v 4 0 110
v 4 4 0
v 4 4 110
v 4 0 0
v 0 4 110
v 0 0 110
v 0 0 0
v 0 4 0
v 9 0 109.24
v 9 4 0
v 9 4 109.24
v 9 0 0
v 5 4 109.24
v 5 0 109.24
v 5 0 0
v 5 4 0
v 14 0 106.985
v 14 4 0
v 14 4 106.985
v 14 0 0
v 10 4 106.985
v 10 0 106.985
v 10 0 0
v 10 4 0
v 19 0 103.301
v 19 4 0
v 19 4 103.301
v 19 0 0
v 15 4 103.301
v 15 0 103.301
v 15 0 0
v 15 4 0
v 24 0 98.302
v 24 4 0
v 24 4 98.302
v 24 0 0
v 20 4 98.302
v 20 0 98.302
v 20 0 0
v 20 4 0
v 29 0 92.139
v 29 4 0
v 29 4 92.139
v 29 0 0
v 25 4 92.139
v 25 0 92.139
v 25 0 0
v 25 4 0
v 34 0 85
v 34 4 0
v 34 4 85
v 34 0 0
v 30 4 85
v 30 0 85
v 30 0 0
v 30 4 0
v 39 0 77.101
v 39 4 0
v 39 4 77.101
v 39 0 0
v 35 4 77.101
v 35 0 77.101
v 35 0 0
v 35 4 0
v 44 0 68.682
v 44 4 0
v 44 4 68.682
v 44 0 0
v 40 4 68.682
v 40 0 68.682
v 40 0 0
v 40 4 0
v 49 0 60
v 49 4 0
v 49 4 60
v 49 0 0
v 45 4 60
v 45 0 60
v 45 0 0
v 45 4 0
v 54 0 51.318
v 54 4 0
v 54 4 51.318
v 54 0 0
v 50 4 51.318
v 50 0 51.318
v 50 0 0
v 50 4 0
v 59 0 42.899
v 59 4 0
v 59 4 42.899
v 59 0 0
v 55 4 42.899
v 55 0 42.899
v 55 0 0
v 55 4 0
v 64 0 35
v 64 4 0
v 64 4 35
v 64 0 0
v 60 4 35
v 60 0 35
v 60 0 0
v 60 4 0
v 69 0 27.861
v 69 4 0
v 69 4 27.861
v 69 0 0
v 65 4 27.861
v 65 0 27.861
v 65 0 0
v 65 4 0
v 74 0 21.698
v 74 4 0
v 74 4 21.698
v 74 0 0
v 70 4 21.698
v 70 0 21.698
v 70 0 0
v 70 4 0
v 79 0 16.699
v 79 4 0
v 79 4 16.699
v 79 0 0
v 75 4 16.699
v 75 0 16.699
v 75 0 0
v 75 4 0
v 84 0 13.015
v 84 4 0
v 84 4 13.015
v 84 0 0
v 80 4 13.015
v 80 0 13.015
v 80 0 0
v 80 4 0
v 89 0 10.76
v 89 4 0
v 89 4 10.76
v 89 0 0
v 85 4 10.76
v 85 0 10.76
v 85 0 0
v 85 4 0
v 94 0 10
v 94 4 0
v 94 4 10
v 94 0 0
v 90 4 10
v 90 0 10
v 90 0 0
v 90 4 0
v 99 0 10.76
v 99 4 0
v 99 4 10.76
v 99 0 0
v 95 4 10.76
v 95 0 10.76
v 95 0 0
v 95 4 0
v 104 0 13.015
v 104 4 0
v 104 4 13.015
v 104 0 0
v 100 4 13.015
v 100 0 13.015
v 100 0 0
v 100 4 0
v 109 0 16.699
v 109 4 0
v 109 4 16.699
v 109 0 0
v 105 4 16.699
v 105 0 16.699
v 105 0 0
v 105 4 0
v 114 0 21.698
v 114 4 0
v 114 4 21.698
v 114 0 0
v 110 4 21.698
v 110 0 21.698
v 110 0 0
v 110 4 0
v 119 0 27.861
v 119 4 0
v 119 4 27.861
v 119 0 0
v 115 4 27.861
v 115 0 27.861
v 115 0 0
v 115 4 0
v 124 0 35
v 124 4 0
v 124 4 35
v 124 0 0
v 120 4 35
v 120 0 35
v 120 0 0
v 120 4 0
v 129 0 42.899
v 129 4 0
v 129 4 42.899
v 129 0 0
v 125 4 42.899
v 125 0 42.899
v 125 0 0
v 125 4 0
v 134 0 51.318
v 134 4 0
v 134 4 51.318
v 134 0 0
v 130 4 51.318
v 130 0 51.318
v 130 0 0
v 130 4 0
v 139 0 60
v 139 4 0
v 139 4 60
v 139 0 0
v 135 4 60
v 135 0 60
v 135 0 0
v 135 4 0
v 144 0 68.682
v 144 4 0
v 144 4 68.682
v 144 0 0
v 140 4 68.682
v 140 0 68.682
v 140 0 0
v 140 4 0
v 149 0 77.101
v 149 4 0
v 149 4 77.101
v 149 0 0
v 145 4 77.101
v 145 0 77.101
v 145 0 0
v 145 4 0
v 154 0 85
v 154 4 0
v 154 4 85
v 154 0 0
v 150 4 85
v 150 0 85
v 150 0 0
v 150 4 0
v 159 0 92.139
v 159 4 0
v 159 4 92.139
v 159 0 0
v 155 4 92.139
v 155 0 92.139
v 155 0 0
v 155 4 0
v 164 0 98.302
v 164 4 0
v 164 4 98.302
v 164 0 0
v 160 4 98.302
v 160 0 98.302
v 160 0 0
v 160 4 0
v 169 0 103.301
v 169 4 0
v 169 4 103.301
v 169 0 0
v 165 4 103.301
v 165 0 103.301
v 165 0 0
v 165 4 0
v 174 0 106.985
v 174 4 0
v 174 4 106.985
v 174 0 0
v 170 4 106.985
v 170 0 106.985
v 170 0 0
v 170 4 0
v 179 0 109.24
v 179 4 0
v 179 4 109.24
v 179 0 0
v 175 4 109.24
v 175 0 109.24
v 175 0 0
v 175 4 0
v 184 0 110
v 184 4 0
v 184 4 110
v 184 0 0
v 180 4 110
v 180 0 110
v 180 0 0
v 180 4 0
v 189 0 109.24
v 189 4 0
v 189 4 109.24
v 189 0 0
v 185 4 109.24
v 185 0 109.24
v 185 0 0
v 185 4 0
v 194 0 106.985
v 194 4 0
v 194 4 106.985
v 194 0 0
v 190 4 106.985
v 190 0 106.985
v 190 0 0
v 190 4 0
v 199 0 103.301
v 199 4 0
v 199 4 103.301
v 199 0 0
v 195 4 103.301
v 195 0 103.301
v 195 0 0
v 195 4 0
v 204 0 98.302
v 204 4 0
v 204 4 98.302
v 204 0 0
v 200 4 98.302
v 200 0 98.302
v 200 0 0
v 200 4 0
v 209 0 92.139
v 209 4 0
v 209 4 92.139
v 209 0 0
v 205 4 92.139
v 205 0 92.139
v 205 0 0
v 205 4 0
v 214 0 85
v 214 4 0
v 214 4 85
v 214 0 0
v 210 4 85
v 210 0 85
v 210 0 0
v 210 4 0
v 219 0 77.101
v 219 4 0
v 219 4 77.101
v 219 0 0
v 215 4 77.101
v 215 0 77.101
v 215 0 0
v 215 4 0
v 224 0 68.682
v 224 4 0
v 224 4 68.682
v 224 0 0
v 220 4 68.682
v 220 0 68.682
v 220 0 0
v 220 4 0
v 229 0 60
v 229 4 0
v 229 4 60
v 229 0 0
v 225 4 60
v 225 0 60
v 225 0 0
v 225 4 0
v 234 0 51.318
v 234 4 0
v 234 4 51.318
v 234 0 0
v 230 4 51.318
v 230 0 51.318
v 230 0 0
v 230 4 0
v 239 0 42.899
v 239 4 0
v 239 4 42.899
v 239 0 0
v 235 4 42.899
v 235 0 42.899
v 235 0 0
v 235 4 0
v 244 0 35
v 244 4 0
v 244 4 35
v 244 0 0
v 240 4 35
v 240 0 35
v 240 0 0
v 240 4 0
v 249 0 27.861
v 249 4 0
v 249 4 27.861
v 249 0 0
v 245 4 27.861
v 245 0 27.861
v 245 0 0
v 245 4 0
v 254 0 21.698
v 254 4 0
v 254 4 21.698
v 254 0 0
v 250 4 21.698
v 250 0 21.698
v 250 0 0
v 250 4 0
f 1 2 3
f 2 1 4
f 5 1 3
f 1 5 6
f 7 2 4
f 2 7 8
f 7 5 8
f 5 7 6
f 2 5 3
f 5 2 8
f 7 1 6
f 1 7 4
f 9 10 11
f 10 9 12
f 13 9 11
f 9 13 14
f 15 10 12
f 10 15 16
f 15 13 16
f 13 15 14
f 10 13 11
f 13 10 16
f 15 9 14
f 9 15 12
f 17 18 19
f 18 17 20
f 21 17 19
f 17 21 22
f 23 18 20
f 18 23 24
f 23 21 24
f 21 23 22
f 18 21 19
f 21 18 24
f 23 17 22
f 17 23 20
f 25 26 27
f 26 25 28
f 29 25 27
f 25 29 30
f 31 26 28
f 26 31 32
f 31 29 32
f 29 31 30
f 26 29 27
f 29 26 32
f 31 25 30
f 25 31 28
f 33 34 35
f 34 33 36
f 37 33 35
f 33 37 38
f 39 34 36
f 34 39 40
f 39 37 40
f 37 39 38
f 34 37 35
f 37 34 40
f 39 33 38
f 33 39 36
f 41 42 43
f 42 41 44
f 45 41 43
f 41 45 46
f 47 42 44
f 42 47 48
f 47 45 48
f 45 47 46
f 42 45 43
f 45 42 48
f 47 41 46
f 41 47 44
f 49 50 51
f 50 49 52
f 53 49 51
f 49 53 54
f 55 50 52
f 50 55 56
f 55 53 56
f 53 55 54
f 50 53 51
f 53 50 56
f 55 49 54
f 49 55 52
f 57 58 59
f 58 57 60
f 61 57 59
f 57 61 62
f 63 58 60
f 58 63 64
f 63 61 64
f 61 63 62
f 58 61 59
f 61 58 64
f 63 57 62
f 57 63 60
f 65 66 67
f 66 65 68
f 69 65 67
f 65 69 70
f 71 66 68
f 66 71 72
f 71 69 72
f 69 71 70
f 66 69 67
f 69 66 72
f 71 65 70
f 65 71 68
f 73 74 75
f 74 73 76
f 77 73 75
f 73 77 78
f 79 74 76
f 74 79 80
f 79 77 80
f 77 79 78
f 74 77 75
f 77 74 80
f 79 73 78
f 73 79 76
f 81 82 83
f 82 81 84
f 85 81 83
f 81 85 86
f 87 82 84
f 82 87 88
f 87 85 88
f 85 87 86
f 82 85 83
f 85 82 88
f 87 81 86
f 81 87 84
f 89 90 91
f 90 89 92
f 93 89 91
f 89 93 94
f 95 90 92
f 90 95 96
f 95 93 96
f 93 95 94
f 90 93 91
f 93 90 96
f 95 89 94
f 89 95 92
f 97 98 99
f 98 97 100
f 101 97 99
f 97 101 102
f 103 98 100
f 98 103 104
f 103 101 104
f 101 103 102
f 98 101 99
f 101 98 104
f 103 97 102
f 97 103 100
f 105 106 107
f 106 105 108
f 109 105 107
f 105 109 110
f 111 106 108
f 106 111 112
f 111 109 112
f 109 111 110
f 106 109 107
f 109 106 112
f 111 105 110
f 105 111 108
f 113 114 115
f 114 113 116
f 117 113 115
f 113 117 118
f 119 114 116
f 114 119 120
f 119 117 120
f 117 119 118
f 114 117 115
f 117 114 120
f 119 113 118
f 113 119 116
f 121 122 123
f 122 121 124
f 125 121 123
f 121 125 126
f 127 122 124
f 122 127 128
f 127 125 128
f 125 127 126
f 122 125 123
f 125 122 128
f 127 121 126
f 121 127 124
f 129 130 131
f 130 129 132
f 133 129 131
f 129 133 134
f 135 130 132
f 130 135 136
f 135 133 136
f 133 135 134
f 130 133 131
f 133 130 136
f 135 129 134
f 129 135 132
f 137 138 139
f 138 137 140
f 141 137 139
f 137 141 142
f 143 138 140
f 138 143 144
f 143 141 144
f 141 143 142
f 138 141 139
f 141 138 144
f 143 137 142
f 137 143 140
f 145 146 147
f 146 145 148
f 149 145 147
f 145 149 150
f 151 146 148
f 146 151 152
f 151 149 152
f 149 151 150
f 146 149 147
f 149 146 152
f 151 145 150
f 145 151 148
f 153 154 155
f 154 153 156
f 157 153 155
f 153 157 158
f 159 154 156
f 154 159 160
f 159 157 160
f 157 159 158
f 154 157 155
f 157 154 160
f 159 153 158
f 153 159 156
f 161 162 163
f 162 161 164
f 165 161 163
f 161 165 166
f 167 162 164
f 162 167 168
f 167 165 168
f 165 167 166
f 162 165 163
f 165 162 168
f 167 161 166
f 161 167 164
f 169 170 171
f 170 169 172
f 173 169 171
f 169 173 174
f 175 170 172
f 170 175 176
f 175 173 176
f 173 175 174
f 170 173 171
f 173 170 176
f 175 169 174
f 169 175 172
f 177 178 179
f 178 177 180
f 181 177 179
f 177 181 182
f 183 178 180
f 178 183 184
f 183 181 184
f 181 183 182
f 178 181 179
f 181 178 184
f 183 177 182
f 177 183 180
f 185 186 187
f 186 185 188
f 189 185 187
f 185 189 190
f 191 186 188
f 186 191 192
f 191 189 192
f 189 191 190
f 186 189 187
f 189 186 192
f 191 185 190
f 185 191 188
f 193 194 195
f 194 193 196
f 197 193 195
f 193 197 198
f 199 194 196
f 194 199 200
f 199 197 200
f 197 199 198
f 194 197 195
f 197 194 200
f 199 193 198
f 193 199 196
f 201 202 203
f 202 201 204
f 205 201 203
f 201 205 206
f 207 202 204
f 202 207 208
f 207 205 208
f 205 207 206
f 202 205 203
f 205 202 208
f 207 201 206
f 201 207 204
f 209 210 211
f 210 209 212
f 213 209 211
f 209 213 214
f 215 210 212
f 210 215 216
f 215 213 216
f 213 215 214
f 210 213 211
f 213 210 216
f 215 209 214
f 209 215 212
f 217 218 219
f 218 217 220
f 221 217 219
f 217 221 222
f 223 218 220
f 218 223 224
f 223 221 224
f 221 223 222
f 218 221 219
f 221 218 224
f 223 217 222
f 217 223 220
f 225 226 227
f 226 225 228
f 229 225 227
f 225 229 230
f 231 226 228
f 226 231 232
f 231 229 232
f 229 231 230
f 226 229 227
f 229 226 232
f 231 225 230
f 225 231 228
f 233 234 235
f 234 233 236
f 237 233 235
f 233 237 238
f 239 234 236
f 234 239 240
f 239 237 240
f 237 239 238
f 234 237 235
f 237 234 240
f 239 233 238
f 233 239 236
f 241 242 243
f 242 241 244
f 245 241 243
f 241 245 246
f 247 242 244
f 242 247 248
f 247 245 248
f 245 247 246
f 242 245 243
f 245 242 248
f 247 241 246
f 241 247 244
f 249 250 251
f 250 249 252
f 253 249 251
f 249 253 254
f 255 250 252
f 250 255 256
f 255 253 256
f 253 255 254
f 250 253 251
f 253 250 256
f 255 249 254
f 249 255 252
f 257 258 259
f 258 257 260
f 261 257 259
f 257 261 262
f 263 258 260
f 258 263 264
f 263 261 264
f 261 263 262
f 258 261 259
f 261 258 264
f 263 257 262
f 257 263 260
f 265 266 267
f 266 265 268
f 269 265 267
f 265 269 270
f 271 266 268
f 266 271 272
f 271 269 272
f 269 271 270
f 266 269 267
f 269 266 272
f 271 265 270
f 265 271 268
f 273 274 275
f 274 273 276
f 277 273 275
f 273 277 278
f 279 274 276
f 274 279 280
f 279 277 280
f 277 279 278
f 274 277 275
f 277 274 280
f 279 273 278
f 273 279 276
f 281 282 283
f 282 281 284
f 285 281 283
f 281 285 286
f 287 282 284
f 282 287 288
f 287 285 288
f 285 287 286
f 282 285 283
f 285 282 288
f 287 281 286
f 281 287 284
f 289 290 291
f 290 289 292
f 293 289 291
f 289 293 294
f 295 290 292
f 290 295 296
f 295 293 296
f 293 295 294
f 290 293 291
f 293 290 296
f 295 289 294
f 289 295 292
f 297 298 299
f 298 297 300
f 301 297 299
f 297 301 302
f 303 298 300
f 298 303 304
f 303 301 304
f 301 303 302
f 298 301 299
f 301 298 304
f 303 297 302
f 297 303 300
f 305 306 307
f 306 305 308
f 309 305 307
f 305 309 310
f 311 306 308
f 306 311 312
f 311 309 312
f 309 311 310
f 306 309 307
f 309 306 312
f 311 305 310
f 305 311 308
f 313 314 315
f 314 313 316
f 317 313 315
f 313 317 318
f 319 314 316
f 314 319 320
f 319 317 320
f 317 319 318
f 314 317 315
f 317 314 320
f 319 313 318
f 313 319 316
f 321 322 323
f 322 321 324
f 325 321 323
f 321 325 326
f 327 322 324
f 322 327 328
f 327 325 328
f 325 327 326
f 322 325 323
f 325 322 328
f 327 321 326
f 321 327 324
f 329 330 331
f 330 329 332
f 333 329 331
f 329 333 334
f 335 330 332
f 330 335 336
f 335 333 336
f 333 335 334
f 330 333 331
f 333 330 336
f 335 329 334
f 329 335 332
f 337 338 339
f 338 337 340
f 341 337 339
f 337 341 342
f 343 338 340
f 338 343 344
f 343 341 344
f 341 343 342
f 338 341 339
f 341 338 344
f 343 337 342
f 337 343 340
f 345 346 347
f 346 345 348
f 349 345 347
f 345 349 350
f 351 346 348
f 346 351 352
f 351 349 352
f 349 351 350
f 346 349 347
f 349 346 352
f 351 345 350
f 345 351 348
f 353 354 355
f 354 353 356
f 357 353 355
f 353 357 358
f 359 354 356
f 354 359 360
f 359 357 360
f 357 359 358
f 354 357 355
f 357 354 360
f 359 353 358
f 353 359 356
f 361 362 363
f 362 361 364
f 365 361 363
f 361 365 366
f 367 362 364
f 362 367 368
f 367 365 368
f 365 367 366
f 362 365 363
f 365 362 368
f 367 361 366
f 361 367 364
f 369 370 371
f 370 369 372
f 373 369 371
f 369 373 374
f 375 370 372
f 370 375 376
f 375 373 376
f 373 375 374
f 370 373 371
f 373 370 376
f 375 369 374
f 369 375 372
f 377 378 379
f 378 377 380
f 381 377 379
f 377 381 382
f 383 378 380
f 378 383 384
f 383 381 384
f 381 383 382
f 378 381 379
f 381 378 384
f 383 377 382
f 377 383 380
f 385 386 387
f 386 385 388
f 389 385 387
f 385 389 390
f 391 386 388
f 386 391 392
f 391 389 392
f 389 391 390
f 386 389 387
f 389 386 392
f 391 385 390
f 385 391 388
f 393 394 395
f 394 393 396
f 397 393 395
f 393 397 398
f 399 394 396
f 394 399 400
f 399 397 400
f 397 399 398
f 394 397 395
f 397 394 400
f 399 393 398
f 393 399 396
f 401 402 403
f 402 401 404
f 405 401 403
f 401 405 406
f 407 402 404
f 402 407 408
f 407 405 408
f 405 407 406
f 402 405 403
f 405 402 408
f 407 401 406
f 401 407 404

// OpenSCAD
for (i=[0:50])
    translate([i*5,0,0])
    cube([4,4,cos(i*10)*50+60]);
